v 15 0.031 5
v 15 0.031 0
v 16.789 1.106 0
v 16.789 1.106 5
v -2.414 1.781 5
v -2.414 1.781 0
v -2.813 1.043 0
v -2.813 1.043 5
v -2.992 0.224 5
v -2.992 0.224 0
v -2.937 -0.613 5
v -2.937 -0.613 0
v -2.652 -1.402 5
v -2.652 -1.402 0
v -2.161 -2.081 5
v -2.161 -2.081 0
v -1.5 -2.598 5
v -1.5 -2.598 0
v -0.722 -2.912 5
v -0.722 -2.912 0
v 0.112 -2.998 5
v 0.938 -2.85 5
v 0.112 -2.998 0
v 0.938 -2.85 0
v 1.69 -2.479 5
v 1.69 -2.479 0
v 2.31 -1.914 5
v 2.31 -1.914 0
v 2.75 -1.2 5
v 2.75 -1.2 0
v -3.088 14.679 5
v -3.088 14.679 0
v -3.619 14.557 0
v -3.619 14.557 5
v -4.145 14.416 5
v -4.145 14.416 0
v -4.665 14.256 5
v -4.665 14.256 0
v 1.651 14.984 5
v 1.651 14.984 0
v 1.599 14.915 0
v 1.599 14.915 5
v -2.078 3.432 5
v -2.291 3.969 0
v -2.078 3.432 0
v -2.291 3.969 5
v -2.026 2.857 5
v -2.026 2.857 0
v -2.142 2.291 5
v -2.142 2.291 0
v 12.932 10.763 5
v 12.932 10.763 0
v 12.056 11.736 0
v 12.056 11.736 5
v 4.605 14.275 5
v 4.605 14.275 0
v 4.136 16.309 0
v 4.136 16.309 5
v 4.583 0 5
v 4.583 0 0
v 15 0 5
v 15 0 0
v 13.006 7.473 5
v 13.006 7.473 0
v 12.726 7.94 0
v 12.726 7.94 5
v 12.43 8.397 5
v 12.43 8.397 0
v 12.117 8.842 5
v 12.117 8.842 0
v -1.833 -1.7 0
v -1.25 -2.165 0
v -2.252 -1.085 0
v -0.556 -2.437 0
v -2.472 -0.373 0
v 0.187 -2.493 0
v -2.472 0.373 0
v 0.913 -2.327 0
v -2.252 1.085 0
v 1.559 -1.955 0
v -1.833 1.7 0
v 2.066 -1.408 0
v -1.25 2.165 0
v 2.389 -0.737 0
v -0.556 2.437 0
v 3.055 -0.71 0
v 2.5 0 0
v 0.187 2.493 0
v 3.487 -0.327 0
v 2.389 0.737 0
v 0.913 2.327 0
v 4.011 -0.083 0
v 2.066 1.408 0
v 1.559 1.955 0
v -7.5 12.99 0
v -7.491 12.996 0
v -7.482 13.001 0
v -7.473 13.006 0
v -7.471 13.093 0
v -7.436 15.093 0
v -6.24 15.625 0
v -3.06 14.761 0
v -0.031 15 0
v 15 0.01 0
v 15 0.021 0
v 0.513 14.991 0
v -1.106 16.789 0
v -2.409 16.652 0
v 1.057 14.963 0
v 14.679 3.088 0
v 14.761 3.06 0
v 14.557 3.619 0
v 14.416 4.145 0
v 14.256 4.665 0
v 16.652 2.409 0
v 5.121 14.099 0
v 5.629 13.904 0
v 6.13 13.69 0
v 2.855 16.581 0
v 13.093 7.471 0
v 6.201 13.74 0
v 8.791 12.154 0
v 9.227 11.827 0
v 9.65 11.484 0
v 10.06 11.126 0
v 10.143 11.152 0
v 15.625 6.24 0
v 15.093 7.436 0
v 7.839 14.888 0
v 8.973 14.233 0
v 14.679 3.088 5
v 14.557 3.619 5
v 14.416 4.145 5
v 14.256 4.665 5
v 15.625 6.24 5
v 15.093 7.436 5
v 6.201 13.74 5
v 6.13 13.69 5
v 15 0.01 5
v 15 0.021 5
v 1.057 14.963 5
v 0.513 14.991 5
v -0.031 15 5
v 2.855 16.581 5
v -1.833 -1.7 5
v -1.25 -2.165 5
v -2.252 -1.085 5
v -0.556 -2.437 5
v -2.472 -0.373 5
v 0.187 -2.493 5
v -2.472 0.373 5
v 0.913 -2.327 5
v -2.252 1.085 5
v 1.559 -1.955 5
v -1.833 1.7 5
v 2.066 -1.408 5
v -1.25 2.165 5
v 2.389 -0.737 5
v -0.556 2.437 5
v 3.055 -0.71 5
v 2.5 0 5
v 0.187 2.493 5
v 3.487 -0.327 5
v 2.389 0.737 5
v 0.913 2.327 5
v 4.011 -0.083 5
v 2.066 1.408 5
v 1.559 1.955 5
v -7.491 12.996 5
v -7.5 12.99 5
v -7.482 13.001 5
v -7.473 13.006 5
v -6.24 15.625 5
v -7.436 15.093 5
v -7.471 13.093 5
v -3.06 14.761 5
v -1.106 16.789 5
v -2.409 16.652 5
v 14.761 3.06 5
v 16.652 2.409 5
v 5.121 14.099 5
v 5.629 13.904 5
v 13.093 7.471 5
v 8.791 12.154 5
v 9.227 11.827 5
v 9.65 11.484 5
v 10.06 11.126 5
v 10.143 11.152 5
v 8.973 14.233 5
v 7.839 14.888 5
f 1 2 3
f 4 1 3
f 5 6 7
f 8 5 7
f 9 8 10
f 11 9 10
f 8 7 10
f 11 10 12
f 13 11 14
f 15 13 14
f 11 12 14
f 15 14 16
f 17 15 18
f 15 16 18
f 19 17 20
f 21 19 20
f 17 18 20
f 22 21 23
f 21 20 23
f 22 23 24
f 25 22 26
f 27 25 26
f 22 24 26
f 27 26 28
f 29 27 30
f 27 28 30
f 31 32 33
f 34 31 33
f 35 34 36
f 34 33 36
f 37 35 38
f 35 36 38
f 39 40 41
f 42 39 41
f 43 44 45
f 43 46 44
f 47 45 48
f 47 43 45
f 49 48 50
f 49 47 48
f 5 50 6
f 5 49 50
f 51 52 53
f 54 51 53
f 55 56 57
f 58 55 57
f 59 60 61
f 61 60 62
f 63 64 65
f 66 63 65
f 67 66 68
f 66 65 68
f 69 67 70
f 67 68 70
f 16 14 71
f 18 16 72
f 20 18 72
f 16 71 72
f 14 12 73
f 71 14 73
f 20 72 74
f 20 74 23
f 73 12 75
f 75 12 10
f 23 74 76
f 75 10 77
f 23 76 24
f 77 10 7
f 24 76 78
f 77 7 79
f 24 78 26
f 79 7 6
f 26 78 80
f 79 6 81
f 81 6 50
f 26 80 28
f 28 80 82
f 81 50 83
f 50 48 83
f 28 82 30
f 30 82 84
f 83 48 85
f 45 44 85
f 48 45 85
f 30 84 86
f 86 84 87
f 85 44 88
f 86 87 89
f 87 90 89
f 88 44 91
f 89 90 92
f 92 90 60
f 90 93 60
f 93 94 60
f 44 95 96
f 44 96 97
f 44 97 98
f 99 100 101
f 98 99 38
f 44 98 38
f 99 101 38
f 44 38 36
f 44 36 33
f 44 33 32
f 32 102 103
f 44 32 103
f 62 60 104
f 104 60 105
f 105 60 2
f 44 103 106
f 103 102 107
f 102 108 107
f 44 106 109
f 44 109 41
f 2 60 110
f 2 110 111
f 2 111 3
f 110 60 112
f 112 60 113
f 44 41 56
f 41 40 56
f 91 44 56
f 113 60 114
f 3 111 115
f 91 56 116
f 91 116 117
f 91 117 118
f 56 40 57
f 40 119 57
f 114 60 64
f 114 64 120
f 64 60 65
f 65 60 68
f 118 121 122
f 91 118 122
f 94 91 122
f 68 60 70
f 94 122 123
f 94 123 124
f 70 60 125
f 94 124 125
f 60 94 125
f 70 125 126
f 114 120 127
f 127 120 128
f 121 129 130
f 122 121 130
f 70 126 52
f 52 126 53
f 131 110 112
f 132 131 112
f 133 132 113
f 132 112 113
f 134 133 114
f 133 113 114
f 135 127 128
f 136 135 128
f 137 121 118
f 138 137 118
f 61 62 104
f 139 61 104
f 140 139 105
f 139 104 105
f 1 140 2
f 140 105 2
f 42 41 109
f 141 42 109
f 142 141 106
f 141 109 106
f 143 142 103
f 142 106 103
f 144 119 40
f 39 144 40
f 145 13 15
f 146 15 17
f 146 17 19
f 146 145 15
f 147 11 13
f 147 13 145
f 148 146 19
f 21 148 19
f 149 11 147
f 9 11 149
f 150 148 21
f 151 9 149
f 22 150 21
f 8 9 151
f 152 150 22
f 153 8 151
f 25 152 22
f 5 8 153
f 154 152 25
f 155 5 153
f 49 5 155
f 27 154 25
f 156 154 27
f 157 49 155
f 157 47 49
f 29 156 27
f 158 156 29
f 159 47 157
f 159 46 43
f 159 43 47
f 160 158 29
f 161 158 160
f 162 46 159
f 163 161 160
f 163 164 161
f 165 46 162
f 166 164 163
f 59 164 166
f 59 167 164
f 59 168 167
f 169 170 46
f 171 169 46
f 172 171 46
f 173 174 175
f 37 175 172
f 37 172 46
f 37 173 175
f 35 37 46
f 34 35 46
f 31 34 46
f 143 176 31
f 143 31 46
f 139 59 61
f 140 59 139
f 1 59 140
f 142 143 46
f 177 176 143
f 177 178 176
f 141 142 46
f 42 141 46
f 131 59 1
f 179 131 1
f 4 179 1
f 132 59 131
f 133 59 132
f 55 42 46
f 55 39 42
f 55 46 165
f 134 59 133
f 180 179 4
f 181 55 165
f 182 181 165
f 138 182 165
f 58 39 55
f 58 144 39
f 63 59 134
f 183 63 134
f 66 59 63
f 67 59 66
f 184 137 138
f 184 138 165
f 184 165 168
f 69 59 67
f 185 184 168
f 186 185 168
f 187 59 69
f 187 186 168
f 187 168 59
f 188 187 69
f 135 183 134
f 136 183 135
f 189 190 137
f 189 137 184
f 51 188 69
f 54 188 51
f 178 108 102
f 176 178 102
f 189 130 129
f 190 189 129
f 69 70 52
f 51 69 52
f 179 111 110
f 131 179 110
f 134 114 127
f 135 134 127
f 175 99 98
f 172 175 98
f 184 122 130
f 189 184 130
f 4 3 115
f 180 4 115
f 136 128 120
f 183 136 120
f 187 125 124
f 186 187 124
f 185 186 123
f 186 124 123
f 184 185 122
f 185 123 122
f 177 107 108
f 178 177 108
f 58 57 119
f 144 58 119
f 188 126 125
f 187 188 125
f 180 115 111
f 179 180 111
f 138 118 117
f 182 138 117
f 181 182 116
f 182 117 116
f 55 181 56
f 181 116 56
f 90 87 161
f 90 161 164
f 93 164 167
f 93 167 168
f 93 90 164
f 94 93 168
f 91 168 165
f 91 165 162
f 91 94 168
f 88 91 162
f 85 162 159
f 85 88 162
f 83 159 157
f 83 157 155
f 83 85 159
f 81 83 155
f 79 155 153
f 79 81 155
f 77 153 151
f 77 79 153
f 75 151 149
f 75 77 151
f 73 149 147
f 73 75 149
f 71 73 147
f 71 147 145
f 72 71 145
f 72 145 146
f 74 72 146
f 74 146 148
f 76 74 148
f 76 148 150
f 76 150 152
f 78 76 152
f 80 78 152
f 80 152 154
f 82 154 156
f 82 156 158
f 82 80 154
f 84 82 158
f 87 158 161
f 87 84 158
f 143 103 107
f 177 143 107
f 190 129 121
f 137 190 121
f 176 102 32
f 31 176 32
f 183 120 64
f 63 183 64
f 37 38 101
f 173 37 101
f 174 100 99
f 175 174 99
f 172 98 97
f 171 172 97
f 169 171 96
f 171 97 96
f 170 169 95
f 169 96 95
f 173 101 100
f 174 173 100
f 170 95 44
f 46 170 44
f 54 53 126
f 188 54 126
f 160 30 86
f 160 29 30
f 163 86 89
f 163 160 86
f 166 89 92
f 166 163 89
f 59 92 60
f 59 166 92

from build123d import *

# Parameters (mm, degrees)
SKETCH1_R           = 2.5
BOSS_EXTRUDE1_DEPTH = 5
FILLET1_R           = 2
FILLET2_R           = 2


with BuildPart() as part:
    # Sketch1 → Boss-Extrude1 (new body)
    with BuildSketch(Plane.XY):
        with BuildLine():
            Line((-7.5, 12.990381057), (-1.5, 2.598076211))
            ThreePointArc((-1.5, 2.598076211), (-1.5, -2.598076211), (3, 0))
            Line((3, 0), (15, 0))
            ThreePointArc((15, 0), (14.999991842, 0.01564381), (14.999967369, 0.031287604))
            Line((14.999967369, 0.031287604), (16.788955727, 1.106220256))
            Line((16.788955727, 1.106220256), (16.652072887, 2.408573483))
            Line((16.652072887, 2.408573483), (14.761035736, 3.059709792))
            Line((14.761035736, 3.059709792), (14.678687152, 3.088064683))
            ThreePointArc((14.678687152, 3.088064683), (14.488887394, 3.882285677), (14.25614831, 4.665001112))
            Line((14.25614831, 4.665001112), (15.625404887, 6.24015062))
            Line((15.625404887, 6.24015062), (15.09277229, 7.43646302))
            Line((15.09277229, 7.43646302), (13.0930769, 7.471367833))
            Line((13.0930769, 7.471367833), (13.0059966, 7.472887825))
            ThreePointArc((13.0059966, 7.472887825), (12.580058519, 8.169585525), (12.116838125, 8.842071808))
            Line((12.116838125, 8.842071808), (12.932330549, 10.763251564))
            Line((12.932330549, 10.763251564), (12.056085985, 11.736419743))
            Line((12.056085985, 11.736419743), (10.143476473, 11.151676334))
            Line((10.143476473, 11.151676334), (10.060188482, 11.12621264))
            ThreePointArc((10.060188482, 11.12621264), (9.439805866, 11.657189422), (8.791447401, 12.153618909))
            Line((8.791447401, 12.153618909), (8.973349591, 14.232770453))
            Line((8.973349591, 14.232770453), (7.839265983, 14.887533929))
            Line((7.839265983, 14.887533929), (6.200961894, 13.740381057))
            Line((6.200961894, 13.740381057), (6.129619023, 13.69042624))
            ThreePointArc((6.129619023, 13.69042624), (5.375519243, 14.003706397), (4.605488553, 14.275485112))
            Line((4.605488553, 14.275485112), (4.135994655, 16.309086604))
            Line((4.135994655, 16.309086604), (2.855084007, 16.581352567))
            Line((2.855084007, 16.581352567), (1.651453961, 14.984081547))
            Line((1.651453961, 14.984081547), (1.599039745, 14.914525534))
            ThreePointArc((1.599039745, 14.914525534), (0.785039344, 14.979443021), (-0.031287604, 14.999967369))
            Line((-0.031287604, 14.999967369), (-1.106220256, 16.788955727))
            Line((-1.106220256, 16.788955727), (-2.408573483, 16.652072887))
            Line((-2.408573483, 16.652072887), (-3.059709792, 14.761035736))
            Line((-3.059709792, 14.761035736), (-3.088064683, 14.678687152))
            ThreePointArc((-3.088064683, 14.678687152), (-3.882285677, 14.488887394), (-4.665001112, 14.25614831))
            Line((-4.665001112, 14.25614831), (-6.24015062, 15.625404887))
            Line((-6.24015062, 15.625404887), (-7.43646302, 15.09277229))
            Line((-7.43646302, 15.09277229), (-7.471367833, 13.0930769))
            Line((-7.471367833, 13.0930769), (-7.472887825, 13.0059966))
            ThreePointArc((-7.472887825, 13.0059966), (-7.486447984, 12.998195897), (-7.5, 12.990381057))
        make_face()
        Circle(SKETCH1_R, mode=Mode.SUBTRACT)
    extrude(amount=BOSS_EXTRUDE1_DEPTH)

    # Fillet1
    fillet1_edges = [part.edges().sort_by_distance(p)[0] for p in [
        (-1.5, 2.598076211, 2.5),
    ]]
    fillet(fillet1_edges, radius=FILLET1_R)

    # Fillet2
    fillet2_edges = [part.edges().sort_by_distance(p)[0] for p in [
        (3, 0, 2.5),
    ]]
    fillet(fillet2_edges, radius=FILLET2_R)


solid = part.part
